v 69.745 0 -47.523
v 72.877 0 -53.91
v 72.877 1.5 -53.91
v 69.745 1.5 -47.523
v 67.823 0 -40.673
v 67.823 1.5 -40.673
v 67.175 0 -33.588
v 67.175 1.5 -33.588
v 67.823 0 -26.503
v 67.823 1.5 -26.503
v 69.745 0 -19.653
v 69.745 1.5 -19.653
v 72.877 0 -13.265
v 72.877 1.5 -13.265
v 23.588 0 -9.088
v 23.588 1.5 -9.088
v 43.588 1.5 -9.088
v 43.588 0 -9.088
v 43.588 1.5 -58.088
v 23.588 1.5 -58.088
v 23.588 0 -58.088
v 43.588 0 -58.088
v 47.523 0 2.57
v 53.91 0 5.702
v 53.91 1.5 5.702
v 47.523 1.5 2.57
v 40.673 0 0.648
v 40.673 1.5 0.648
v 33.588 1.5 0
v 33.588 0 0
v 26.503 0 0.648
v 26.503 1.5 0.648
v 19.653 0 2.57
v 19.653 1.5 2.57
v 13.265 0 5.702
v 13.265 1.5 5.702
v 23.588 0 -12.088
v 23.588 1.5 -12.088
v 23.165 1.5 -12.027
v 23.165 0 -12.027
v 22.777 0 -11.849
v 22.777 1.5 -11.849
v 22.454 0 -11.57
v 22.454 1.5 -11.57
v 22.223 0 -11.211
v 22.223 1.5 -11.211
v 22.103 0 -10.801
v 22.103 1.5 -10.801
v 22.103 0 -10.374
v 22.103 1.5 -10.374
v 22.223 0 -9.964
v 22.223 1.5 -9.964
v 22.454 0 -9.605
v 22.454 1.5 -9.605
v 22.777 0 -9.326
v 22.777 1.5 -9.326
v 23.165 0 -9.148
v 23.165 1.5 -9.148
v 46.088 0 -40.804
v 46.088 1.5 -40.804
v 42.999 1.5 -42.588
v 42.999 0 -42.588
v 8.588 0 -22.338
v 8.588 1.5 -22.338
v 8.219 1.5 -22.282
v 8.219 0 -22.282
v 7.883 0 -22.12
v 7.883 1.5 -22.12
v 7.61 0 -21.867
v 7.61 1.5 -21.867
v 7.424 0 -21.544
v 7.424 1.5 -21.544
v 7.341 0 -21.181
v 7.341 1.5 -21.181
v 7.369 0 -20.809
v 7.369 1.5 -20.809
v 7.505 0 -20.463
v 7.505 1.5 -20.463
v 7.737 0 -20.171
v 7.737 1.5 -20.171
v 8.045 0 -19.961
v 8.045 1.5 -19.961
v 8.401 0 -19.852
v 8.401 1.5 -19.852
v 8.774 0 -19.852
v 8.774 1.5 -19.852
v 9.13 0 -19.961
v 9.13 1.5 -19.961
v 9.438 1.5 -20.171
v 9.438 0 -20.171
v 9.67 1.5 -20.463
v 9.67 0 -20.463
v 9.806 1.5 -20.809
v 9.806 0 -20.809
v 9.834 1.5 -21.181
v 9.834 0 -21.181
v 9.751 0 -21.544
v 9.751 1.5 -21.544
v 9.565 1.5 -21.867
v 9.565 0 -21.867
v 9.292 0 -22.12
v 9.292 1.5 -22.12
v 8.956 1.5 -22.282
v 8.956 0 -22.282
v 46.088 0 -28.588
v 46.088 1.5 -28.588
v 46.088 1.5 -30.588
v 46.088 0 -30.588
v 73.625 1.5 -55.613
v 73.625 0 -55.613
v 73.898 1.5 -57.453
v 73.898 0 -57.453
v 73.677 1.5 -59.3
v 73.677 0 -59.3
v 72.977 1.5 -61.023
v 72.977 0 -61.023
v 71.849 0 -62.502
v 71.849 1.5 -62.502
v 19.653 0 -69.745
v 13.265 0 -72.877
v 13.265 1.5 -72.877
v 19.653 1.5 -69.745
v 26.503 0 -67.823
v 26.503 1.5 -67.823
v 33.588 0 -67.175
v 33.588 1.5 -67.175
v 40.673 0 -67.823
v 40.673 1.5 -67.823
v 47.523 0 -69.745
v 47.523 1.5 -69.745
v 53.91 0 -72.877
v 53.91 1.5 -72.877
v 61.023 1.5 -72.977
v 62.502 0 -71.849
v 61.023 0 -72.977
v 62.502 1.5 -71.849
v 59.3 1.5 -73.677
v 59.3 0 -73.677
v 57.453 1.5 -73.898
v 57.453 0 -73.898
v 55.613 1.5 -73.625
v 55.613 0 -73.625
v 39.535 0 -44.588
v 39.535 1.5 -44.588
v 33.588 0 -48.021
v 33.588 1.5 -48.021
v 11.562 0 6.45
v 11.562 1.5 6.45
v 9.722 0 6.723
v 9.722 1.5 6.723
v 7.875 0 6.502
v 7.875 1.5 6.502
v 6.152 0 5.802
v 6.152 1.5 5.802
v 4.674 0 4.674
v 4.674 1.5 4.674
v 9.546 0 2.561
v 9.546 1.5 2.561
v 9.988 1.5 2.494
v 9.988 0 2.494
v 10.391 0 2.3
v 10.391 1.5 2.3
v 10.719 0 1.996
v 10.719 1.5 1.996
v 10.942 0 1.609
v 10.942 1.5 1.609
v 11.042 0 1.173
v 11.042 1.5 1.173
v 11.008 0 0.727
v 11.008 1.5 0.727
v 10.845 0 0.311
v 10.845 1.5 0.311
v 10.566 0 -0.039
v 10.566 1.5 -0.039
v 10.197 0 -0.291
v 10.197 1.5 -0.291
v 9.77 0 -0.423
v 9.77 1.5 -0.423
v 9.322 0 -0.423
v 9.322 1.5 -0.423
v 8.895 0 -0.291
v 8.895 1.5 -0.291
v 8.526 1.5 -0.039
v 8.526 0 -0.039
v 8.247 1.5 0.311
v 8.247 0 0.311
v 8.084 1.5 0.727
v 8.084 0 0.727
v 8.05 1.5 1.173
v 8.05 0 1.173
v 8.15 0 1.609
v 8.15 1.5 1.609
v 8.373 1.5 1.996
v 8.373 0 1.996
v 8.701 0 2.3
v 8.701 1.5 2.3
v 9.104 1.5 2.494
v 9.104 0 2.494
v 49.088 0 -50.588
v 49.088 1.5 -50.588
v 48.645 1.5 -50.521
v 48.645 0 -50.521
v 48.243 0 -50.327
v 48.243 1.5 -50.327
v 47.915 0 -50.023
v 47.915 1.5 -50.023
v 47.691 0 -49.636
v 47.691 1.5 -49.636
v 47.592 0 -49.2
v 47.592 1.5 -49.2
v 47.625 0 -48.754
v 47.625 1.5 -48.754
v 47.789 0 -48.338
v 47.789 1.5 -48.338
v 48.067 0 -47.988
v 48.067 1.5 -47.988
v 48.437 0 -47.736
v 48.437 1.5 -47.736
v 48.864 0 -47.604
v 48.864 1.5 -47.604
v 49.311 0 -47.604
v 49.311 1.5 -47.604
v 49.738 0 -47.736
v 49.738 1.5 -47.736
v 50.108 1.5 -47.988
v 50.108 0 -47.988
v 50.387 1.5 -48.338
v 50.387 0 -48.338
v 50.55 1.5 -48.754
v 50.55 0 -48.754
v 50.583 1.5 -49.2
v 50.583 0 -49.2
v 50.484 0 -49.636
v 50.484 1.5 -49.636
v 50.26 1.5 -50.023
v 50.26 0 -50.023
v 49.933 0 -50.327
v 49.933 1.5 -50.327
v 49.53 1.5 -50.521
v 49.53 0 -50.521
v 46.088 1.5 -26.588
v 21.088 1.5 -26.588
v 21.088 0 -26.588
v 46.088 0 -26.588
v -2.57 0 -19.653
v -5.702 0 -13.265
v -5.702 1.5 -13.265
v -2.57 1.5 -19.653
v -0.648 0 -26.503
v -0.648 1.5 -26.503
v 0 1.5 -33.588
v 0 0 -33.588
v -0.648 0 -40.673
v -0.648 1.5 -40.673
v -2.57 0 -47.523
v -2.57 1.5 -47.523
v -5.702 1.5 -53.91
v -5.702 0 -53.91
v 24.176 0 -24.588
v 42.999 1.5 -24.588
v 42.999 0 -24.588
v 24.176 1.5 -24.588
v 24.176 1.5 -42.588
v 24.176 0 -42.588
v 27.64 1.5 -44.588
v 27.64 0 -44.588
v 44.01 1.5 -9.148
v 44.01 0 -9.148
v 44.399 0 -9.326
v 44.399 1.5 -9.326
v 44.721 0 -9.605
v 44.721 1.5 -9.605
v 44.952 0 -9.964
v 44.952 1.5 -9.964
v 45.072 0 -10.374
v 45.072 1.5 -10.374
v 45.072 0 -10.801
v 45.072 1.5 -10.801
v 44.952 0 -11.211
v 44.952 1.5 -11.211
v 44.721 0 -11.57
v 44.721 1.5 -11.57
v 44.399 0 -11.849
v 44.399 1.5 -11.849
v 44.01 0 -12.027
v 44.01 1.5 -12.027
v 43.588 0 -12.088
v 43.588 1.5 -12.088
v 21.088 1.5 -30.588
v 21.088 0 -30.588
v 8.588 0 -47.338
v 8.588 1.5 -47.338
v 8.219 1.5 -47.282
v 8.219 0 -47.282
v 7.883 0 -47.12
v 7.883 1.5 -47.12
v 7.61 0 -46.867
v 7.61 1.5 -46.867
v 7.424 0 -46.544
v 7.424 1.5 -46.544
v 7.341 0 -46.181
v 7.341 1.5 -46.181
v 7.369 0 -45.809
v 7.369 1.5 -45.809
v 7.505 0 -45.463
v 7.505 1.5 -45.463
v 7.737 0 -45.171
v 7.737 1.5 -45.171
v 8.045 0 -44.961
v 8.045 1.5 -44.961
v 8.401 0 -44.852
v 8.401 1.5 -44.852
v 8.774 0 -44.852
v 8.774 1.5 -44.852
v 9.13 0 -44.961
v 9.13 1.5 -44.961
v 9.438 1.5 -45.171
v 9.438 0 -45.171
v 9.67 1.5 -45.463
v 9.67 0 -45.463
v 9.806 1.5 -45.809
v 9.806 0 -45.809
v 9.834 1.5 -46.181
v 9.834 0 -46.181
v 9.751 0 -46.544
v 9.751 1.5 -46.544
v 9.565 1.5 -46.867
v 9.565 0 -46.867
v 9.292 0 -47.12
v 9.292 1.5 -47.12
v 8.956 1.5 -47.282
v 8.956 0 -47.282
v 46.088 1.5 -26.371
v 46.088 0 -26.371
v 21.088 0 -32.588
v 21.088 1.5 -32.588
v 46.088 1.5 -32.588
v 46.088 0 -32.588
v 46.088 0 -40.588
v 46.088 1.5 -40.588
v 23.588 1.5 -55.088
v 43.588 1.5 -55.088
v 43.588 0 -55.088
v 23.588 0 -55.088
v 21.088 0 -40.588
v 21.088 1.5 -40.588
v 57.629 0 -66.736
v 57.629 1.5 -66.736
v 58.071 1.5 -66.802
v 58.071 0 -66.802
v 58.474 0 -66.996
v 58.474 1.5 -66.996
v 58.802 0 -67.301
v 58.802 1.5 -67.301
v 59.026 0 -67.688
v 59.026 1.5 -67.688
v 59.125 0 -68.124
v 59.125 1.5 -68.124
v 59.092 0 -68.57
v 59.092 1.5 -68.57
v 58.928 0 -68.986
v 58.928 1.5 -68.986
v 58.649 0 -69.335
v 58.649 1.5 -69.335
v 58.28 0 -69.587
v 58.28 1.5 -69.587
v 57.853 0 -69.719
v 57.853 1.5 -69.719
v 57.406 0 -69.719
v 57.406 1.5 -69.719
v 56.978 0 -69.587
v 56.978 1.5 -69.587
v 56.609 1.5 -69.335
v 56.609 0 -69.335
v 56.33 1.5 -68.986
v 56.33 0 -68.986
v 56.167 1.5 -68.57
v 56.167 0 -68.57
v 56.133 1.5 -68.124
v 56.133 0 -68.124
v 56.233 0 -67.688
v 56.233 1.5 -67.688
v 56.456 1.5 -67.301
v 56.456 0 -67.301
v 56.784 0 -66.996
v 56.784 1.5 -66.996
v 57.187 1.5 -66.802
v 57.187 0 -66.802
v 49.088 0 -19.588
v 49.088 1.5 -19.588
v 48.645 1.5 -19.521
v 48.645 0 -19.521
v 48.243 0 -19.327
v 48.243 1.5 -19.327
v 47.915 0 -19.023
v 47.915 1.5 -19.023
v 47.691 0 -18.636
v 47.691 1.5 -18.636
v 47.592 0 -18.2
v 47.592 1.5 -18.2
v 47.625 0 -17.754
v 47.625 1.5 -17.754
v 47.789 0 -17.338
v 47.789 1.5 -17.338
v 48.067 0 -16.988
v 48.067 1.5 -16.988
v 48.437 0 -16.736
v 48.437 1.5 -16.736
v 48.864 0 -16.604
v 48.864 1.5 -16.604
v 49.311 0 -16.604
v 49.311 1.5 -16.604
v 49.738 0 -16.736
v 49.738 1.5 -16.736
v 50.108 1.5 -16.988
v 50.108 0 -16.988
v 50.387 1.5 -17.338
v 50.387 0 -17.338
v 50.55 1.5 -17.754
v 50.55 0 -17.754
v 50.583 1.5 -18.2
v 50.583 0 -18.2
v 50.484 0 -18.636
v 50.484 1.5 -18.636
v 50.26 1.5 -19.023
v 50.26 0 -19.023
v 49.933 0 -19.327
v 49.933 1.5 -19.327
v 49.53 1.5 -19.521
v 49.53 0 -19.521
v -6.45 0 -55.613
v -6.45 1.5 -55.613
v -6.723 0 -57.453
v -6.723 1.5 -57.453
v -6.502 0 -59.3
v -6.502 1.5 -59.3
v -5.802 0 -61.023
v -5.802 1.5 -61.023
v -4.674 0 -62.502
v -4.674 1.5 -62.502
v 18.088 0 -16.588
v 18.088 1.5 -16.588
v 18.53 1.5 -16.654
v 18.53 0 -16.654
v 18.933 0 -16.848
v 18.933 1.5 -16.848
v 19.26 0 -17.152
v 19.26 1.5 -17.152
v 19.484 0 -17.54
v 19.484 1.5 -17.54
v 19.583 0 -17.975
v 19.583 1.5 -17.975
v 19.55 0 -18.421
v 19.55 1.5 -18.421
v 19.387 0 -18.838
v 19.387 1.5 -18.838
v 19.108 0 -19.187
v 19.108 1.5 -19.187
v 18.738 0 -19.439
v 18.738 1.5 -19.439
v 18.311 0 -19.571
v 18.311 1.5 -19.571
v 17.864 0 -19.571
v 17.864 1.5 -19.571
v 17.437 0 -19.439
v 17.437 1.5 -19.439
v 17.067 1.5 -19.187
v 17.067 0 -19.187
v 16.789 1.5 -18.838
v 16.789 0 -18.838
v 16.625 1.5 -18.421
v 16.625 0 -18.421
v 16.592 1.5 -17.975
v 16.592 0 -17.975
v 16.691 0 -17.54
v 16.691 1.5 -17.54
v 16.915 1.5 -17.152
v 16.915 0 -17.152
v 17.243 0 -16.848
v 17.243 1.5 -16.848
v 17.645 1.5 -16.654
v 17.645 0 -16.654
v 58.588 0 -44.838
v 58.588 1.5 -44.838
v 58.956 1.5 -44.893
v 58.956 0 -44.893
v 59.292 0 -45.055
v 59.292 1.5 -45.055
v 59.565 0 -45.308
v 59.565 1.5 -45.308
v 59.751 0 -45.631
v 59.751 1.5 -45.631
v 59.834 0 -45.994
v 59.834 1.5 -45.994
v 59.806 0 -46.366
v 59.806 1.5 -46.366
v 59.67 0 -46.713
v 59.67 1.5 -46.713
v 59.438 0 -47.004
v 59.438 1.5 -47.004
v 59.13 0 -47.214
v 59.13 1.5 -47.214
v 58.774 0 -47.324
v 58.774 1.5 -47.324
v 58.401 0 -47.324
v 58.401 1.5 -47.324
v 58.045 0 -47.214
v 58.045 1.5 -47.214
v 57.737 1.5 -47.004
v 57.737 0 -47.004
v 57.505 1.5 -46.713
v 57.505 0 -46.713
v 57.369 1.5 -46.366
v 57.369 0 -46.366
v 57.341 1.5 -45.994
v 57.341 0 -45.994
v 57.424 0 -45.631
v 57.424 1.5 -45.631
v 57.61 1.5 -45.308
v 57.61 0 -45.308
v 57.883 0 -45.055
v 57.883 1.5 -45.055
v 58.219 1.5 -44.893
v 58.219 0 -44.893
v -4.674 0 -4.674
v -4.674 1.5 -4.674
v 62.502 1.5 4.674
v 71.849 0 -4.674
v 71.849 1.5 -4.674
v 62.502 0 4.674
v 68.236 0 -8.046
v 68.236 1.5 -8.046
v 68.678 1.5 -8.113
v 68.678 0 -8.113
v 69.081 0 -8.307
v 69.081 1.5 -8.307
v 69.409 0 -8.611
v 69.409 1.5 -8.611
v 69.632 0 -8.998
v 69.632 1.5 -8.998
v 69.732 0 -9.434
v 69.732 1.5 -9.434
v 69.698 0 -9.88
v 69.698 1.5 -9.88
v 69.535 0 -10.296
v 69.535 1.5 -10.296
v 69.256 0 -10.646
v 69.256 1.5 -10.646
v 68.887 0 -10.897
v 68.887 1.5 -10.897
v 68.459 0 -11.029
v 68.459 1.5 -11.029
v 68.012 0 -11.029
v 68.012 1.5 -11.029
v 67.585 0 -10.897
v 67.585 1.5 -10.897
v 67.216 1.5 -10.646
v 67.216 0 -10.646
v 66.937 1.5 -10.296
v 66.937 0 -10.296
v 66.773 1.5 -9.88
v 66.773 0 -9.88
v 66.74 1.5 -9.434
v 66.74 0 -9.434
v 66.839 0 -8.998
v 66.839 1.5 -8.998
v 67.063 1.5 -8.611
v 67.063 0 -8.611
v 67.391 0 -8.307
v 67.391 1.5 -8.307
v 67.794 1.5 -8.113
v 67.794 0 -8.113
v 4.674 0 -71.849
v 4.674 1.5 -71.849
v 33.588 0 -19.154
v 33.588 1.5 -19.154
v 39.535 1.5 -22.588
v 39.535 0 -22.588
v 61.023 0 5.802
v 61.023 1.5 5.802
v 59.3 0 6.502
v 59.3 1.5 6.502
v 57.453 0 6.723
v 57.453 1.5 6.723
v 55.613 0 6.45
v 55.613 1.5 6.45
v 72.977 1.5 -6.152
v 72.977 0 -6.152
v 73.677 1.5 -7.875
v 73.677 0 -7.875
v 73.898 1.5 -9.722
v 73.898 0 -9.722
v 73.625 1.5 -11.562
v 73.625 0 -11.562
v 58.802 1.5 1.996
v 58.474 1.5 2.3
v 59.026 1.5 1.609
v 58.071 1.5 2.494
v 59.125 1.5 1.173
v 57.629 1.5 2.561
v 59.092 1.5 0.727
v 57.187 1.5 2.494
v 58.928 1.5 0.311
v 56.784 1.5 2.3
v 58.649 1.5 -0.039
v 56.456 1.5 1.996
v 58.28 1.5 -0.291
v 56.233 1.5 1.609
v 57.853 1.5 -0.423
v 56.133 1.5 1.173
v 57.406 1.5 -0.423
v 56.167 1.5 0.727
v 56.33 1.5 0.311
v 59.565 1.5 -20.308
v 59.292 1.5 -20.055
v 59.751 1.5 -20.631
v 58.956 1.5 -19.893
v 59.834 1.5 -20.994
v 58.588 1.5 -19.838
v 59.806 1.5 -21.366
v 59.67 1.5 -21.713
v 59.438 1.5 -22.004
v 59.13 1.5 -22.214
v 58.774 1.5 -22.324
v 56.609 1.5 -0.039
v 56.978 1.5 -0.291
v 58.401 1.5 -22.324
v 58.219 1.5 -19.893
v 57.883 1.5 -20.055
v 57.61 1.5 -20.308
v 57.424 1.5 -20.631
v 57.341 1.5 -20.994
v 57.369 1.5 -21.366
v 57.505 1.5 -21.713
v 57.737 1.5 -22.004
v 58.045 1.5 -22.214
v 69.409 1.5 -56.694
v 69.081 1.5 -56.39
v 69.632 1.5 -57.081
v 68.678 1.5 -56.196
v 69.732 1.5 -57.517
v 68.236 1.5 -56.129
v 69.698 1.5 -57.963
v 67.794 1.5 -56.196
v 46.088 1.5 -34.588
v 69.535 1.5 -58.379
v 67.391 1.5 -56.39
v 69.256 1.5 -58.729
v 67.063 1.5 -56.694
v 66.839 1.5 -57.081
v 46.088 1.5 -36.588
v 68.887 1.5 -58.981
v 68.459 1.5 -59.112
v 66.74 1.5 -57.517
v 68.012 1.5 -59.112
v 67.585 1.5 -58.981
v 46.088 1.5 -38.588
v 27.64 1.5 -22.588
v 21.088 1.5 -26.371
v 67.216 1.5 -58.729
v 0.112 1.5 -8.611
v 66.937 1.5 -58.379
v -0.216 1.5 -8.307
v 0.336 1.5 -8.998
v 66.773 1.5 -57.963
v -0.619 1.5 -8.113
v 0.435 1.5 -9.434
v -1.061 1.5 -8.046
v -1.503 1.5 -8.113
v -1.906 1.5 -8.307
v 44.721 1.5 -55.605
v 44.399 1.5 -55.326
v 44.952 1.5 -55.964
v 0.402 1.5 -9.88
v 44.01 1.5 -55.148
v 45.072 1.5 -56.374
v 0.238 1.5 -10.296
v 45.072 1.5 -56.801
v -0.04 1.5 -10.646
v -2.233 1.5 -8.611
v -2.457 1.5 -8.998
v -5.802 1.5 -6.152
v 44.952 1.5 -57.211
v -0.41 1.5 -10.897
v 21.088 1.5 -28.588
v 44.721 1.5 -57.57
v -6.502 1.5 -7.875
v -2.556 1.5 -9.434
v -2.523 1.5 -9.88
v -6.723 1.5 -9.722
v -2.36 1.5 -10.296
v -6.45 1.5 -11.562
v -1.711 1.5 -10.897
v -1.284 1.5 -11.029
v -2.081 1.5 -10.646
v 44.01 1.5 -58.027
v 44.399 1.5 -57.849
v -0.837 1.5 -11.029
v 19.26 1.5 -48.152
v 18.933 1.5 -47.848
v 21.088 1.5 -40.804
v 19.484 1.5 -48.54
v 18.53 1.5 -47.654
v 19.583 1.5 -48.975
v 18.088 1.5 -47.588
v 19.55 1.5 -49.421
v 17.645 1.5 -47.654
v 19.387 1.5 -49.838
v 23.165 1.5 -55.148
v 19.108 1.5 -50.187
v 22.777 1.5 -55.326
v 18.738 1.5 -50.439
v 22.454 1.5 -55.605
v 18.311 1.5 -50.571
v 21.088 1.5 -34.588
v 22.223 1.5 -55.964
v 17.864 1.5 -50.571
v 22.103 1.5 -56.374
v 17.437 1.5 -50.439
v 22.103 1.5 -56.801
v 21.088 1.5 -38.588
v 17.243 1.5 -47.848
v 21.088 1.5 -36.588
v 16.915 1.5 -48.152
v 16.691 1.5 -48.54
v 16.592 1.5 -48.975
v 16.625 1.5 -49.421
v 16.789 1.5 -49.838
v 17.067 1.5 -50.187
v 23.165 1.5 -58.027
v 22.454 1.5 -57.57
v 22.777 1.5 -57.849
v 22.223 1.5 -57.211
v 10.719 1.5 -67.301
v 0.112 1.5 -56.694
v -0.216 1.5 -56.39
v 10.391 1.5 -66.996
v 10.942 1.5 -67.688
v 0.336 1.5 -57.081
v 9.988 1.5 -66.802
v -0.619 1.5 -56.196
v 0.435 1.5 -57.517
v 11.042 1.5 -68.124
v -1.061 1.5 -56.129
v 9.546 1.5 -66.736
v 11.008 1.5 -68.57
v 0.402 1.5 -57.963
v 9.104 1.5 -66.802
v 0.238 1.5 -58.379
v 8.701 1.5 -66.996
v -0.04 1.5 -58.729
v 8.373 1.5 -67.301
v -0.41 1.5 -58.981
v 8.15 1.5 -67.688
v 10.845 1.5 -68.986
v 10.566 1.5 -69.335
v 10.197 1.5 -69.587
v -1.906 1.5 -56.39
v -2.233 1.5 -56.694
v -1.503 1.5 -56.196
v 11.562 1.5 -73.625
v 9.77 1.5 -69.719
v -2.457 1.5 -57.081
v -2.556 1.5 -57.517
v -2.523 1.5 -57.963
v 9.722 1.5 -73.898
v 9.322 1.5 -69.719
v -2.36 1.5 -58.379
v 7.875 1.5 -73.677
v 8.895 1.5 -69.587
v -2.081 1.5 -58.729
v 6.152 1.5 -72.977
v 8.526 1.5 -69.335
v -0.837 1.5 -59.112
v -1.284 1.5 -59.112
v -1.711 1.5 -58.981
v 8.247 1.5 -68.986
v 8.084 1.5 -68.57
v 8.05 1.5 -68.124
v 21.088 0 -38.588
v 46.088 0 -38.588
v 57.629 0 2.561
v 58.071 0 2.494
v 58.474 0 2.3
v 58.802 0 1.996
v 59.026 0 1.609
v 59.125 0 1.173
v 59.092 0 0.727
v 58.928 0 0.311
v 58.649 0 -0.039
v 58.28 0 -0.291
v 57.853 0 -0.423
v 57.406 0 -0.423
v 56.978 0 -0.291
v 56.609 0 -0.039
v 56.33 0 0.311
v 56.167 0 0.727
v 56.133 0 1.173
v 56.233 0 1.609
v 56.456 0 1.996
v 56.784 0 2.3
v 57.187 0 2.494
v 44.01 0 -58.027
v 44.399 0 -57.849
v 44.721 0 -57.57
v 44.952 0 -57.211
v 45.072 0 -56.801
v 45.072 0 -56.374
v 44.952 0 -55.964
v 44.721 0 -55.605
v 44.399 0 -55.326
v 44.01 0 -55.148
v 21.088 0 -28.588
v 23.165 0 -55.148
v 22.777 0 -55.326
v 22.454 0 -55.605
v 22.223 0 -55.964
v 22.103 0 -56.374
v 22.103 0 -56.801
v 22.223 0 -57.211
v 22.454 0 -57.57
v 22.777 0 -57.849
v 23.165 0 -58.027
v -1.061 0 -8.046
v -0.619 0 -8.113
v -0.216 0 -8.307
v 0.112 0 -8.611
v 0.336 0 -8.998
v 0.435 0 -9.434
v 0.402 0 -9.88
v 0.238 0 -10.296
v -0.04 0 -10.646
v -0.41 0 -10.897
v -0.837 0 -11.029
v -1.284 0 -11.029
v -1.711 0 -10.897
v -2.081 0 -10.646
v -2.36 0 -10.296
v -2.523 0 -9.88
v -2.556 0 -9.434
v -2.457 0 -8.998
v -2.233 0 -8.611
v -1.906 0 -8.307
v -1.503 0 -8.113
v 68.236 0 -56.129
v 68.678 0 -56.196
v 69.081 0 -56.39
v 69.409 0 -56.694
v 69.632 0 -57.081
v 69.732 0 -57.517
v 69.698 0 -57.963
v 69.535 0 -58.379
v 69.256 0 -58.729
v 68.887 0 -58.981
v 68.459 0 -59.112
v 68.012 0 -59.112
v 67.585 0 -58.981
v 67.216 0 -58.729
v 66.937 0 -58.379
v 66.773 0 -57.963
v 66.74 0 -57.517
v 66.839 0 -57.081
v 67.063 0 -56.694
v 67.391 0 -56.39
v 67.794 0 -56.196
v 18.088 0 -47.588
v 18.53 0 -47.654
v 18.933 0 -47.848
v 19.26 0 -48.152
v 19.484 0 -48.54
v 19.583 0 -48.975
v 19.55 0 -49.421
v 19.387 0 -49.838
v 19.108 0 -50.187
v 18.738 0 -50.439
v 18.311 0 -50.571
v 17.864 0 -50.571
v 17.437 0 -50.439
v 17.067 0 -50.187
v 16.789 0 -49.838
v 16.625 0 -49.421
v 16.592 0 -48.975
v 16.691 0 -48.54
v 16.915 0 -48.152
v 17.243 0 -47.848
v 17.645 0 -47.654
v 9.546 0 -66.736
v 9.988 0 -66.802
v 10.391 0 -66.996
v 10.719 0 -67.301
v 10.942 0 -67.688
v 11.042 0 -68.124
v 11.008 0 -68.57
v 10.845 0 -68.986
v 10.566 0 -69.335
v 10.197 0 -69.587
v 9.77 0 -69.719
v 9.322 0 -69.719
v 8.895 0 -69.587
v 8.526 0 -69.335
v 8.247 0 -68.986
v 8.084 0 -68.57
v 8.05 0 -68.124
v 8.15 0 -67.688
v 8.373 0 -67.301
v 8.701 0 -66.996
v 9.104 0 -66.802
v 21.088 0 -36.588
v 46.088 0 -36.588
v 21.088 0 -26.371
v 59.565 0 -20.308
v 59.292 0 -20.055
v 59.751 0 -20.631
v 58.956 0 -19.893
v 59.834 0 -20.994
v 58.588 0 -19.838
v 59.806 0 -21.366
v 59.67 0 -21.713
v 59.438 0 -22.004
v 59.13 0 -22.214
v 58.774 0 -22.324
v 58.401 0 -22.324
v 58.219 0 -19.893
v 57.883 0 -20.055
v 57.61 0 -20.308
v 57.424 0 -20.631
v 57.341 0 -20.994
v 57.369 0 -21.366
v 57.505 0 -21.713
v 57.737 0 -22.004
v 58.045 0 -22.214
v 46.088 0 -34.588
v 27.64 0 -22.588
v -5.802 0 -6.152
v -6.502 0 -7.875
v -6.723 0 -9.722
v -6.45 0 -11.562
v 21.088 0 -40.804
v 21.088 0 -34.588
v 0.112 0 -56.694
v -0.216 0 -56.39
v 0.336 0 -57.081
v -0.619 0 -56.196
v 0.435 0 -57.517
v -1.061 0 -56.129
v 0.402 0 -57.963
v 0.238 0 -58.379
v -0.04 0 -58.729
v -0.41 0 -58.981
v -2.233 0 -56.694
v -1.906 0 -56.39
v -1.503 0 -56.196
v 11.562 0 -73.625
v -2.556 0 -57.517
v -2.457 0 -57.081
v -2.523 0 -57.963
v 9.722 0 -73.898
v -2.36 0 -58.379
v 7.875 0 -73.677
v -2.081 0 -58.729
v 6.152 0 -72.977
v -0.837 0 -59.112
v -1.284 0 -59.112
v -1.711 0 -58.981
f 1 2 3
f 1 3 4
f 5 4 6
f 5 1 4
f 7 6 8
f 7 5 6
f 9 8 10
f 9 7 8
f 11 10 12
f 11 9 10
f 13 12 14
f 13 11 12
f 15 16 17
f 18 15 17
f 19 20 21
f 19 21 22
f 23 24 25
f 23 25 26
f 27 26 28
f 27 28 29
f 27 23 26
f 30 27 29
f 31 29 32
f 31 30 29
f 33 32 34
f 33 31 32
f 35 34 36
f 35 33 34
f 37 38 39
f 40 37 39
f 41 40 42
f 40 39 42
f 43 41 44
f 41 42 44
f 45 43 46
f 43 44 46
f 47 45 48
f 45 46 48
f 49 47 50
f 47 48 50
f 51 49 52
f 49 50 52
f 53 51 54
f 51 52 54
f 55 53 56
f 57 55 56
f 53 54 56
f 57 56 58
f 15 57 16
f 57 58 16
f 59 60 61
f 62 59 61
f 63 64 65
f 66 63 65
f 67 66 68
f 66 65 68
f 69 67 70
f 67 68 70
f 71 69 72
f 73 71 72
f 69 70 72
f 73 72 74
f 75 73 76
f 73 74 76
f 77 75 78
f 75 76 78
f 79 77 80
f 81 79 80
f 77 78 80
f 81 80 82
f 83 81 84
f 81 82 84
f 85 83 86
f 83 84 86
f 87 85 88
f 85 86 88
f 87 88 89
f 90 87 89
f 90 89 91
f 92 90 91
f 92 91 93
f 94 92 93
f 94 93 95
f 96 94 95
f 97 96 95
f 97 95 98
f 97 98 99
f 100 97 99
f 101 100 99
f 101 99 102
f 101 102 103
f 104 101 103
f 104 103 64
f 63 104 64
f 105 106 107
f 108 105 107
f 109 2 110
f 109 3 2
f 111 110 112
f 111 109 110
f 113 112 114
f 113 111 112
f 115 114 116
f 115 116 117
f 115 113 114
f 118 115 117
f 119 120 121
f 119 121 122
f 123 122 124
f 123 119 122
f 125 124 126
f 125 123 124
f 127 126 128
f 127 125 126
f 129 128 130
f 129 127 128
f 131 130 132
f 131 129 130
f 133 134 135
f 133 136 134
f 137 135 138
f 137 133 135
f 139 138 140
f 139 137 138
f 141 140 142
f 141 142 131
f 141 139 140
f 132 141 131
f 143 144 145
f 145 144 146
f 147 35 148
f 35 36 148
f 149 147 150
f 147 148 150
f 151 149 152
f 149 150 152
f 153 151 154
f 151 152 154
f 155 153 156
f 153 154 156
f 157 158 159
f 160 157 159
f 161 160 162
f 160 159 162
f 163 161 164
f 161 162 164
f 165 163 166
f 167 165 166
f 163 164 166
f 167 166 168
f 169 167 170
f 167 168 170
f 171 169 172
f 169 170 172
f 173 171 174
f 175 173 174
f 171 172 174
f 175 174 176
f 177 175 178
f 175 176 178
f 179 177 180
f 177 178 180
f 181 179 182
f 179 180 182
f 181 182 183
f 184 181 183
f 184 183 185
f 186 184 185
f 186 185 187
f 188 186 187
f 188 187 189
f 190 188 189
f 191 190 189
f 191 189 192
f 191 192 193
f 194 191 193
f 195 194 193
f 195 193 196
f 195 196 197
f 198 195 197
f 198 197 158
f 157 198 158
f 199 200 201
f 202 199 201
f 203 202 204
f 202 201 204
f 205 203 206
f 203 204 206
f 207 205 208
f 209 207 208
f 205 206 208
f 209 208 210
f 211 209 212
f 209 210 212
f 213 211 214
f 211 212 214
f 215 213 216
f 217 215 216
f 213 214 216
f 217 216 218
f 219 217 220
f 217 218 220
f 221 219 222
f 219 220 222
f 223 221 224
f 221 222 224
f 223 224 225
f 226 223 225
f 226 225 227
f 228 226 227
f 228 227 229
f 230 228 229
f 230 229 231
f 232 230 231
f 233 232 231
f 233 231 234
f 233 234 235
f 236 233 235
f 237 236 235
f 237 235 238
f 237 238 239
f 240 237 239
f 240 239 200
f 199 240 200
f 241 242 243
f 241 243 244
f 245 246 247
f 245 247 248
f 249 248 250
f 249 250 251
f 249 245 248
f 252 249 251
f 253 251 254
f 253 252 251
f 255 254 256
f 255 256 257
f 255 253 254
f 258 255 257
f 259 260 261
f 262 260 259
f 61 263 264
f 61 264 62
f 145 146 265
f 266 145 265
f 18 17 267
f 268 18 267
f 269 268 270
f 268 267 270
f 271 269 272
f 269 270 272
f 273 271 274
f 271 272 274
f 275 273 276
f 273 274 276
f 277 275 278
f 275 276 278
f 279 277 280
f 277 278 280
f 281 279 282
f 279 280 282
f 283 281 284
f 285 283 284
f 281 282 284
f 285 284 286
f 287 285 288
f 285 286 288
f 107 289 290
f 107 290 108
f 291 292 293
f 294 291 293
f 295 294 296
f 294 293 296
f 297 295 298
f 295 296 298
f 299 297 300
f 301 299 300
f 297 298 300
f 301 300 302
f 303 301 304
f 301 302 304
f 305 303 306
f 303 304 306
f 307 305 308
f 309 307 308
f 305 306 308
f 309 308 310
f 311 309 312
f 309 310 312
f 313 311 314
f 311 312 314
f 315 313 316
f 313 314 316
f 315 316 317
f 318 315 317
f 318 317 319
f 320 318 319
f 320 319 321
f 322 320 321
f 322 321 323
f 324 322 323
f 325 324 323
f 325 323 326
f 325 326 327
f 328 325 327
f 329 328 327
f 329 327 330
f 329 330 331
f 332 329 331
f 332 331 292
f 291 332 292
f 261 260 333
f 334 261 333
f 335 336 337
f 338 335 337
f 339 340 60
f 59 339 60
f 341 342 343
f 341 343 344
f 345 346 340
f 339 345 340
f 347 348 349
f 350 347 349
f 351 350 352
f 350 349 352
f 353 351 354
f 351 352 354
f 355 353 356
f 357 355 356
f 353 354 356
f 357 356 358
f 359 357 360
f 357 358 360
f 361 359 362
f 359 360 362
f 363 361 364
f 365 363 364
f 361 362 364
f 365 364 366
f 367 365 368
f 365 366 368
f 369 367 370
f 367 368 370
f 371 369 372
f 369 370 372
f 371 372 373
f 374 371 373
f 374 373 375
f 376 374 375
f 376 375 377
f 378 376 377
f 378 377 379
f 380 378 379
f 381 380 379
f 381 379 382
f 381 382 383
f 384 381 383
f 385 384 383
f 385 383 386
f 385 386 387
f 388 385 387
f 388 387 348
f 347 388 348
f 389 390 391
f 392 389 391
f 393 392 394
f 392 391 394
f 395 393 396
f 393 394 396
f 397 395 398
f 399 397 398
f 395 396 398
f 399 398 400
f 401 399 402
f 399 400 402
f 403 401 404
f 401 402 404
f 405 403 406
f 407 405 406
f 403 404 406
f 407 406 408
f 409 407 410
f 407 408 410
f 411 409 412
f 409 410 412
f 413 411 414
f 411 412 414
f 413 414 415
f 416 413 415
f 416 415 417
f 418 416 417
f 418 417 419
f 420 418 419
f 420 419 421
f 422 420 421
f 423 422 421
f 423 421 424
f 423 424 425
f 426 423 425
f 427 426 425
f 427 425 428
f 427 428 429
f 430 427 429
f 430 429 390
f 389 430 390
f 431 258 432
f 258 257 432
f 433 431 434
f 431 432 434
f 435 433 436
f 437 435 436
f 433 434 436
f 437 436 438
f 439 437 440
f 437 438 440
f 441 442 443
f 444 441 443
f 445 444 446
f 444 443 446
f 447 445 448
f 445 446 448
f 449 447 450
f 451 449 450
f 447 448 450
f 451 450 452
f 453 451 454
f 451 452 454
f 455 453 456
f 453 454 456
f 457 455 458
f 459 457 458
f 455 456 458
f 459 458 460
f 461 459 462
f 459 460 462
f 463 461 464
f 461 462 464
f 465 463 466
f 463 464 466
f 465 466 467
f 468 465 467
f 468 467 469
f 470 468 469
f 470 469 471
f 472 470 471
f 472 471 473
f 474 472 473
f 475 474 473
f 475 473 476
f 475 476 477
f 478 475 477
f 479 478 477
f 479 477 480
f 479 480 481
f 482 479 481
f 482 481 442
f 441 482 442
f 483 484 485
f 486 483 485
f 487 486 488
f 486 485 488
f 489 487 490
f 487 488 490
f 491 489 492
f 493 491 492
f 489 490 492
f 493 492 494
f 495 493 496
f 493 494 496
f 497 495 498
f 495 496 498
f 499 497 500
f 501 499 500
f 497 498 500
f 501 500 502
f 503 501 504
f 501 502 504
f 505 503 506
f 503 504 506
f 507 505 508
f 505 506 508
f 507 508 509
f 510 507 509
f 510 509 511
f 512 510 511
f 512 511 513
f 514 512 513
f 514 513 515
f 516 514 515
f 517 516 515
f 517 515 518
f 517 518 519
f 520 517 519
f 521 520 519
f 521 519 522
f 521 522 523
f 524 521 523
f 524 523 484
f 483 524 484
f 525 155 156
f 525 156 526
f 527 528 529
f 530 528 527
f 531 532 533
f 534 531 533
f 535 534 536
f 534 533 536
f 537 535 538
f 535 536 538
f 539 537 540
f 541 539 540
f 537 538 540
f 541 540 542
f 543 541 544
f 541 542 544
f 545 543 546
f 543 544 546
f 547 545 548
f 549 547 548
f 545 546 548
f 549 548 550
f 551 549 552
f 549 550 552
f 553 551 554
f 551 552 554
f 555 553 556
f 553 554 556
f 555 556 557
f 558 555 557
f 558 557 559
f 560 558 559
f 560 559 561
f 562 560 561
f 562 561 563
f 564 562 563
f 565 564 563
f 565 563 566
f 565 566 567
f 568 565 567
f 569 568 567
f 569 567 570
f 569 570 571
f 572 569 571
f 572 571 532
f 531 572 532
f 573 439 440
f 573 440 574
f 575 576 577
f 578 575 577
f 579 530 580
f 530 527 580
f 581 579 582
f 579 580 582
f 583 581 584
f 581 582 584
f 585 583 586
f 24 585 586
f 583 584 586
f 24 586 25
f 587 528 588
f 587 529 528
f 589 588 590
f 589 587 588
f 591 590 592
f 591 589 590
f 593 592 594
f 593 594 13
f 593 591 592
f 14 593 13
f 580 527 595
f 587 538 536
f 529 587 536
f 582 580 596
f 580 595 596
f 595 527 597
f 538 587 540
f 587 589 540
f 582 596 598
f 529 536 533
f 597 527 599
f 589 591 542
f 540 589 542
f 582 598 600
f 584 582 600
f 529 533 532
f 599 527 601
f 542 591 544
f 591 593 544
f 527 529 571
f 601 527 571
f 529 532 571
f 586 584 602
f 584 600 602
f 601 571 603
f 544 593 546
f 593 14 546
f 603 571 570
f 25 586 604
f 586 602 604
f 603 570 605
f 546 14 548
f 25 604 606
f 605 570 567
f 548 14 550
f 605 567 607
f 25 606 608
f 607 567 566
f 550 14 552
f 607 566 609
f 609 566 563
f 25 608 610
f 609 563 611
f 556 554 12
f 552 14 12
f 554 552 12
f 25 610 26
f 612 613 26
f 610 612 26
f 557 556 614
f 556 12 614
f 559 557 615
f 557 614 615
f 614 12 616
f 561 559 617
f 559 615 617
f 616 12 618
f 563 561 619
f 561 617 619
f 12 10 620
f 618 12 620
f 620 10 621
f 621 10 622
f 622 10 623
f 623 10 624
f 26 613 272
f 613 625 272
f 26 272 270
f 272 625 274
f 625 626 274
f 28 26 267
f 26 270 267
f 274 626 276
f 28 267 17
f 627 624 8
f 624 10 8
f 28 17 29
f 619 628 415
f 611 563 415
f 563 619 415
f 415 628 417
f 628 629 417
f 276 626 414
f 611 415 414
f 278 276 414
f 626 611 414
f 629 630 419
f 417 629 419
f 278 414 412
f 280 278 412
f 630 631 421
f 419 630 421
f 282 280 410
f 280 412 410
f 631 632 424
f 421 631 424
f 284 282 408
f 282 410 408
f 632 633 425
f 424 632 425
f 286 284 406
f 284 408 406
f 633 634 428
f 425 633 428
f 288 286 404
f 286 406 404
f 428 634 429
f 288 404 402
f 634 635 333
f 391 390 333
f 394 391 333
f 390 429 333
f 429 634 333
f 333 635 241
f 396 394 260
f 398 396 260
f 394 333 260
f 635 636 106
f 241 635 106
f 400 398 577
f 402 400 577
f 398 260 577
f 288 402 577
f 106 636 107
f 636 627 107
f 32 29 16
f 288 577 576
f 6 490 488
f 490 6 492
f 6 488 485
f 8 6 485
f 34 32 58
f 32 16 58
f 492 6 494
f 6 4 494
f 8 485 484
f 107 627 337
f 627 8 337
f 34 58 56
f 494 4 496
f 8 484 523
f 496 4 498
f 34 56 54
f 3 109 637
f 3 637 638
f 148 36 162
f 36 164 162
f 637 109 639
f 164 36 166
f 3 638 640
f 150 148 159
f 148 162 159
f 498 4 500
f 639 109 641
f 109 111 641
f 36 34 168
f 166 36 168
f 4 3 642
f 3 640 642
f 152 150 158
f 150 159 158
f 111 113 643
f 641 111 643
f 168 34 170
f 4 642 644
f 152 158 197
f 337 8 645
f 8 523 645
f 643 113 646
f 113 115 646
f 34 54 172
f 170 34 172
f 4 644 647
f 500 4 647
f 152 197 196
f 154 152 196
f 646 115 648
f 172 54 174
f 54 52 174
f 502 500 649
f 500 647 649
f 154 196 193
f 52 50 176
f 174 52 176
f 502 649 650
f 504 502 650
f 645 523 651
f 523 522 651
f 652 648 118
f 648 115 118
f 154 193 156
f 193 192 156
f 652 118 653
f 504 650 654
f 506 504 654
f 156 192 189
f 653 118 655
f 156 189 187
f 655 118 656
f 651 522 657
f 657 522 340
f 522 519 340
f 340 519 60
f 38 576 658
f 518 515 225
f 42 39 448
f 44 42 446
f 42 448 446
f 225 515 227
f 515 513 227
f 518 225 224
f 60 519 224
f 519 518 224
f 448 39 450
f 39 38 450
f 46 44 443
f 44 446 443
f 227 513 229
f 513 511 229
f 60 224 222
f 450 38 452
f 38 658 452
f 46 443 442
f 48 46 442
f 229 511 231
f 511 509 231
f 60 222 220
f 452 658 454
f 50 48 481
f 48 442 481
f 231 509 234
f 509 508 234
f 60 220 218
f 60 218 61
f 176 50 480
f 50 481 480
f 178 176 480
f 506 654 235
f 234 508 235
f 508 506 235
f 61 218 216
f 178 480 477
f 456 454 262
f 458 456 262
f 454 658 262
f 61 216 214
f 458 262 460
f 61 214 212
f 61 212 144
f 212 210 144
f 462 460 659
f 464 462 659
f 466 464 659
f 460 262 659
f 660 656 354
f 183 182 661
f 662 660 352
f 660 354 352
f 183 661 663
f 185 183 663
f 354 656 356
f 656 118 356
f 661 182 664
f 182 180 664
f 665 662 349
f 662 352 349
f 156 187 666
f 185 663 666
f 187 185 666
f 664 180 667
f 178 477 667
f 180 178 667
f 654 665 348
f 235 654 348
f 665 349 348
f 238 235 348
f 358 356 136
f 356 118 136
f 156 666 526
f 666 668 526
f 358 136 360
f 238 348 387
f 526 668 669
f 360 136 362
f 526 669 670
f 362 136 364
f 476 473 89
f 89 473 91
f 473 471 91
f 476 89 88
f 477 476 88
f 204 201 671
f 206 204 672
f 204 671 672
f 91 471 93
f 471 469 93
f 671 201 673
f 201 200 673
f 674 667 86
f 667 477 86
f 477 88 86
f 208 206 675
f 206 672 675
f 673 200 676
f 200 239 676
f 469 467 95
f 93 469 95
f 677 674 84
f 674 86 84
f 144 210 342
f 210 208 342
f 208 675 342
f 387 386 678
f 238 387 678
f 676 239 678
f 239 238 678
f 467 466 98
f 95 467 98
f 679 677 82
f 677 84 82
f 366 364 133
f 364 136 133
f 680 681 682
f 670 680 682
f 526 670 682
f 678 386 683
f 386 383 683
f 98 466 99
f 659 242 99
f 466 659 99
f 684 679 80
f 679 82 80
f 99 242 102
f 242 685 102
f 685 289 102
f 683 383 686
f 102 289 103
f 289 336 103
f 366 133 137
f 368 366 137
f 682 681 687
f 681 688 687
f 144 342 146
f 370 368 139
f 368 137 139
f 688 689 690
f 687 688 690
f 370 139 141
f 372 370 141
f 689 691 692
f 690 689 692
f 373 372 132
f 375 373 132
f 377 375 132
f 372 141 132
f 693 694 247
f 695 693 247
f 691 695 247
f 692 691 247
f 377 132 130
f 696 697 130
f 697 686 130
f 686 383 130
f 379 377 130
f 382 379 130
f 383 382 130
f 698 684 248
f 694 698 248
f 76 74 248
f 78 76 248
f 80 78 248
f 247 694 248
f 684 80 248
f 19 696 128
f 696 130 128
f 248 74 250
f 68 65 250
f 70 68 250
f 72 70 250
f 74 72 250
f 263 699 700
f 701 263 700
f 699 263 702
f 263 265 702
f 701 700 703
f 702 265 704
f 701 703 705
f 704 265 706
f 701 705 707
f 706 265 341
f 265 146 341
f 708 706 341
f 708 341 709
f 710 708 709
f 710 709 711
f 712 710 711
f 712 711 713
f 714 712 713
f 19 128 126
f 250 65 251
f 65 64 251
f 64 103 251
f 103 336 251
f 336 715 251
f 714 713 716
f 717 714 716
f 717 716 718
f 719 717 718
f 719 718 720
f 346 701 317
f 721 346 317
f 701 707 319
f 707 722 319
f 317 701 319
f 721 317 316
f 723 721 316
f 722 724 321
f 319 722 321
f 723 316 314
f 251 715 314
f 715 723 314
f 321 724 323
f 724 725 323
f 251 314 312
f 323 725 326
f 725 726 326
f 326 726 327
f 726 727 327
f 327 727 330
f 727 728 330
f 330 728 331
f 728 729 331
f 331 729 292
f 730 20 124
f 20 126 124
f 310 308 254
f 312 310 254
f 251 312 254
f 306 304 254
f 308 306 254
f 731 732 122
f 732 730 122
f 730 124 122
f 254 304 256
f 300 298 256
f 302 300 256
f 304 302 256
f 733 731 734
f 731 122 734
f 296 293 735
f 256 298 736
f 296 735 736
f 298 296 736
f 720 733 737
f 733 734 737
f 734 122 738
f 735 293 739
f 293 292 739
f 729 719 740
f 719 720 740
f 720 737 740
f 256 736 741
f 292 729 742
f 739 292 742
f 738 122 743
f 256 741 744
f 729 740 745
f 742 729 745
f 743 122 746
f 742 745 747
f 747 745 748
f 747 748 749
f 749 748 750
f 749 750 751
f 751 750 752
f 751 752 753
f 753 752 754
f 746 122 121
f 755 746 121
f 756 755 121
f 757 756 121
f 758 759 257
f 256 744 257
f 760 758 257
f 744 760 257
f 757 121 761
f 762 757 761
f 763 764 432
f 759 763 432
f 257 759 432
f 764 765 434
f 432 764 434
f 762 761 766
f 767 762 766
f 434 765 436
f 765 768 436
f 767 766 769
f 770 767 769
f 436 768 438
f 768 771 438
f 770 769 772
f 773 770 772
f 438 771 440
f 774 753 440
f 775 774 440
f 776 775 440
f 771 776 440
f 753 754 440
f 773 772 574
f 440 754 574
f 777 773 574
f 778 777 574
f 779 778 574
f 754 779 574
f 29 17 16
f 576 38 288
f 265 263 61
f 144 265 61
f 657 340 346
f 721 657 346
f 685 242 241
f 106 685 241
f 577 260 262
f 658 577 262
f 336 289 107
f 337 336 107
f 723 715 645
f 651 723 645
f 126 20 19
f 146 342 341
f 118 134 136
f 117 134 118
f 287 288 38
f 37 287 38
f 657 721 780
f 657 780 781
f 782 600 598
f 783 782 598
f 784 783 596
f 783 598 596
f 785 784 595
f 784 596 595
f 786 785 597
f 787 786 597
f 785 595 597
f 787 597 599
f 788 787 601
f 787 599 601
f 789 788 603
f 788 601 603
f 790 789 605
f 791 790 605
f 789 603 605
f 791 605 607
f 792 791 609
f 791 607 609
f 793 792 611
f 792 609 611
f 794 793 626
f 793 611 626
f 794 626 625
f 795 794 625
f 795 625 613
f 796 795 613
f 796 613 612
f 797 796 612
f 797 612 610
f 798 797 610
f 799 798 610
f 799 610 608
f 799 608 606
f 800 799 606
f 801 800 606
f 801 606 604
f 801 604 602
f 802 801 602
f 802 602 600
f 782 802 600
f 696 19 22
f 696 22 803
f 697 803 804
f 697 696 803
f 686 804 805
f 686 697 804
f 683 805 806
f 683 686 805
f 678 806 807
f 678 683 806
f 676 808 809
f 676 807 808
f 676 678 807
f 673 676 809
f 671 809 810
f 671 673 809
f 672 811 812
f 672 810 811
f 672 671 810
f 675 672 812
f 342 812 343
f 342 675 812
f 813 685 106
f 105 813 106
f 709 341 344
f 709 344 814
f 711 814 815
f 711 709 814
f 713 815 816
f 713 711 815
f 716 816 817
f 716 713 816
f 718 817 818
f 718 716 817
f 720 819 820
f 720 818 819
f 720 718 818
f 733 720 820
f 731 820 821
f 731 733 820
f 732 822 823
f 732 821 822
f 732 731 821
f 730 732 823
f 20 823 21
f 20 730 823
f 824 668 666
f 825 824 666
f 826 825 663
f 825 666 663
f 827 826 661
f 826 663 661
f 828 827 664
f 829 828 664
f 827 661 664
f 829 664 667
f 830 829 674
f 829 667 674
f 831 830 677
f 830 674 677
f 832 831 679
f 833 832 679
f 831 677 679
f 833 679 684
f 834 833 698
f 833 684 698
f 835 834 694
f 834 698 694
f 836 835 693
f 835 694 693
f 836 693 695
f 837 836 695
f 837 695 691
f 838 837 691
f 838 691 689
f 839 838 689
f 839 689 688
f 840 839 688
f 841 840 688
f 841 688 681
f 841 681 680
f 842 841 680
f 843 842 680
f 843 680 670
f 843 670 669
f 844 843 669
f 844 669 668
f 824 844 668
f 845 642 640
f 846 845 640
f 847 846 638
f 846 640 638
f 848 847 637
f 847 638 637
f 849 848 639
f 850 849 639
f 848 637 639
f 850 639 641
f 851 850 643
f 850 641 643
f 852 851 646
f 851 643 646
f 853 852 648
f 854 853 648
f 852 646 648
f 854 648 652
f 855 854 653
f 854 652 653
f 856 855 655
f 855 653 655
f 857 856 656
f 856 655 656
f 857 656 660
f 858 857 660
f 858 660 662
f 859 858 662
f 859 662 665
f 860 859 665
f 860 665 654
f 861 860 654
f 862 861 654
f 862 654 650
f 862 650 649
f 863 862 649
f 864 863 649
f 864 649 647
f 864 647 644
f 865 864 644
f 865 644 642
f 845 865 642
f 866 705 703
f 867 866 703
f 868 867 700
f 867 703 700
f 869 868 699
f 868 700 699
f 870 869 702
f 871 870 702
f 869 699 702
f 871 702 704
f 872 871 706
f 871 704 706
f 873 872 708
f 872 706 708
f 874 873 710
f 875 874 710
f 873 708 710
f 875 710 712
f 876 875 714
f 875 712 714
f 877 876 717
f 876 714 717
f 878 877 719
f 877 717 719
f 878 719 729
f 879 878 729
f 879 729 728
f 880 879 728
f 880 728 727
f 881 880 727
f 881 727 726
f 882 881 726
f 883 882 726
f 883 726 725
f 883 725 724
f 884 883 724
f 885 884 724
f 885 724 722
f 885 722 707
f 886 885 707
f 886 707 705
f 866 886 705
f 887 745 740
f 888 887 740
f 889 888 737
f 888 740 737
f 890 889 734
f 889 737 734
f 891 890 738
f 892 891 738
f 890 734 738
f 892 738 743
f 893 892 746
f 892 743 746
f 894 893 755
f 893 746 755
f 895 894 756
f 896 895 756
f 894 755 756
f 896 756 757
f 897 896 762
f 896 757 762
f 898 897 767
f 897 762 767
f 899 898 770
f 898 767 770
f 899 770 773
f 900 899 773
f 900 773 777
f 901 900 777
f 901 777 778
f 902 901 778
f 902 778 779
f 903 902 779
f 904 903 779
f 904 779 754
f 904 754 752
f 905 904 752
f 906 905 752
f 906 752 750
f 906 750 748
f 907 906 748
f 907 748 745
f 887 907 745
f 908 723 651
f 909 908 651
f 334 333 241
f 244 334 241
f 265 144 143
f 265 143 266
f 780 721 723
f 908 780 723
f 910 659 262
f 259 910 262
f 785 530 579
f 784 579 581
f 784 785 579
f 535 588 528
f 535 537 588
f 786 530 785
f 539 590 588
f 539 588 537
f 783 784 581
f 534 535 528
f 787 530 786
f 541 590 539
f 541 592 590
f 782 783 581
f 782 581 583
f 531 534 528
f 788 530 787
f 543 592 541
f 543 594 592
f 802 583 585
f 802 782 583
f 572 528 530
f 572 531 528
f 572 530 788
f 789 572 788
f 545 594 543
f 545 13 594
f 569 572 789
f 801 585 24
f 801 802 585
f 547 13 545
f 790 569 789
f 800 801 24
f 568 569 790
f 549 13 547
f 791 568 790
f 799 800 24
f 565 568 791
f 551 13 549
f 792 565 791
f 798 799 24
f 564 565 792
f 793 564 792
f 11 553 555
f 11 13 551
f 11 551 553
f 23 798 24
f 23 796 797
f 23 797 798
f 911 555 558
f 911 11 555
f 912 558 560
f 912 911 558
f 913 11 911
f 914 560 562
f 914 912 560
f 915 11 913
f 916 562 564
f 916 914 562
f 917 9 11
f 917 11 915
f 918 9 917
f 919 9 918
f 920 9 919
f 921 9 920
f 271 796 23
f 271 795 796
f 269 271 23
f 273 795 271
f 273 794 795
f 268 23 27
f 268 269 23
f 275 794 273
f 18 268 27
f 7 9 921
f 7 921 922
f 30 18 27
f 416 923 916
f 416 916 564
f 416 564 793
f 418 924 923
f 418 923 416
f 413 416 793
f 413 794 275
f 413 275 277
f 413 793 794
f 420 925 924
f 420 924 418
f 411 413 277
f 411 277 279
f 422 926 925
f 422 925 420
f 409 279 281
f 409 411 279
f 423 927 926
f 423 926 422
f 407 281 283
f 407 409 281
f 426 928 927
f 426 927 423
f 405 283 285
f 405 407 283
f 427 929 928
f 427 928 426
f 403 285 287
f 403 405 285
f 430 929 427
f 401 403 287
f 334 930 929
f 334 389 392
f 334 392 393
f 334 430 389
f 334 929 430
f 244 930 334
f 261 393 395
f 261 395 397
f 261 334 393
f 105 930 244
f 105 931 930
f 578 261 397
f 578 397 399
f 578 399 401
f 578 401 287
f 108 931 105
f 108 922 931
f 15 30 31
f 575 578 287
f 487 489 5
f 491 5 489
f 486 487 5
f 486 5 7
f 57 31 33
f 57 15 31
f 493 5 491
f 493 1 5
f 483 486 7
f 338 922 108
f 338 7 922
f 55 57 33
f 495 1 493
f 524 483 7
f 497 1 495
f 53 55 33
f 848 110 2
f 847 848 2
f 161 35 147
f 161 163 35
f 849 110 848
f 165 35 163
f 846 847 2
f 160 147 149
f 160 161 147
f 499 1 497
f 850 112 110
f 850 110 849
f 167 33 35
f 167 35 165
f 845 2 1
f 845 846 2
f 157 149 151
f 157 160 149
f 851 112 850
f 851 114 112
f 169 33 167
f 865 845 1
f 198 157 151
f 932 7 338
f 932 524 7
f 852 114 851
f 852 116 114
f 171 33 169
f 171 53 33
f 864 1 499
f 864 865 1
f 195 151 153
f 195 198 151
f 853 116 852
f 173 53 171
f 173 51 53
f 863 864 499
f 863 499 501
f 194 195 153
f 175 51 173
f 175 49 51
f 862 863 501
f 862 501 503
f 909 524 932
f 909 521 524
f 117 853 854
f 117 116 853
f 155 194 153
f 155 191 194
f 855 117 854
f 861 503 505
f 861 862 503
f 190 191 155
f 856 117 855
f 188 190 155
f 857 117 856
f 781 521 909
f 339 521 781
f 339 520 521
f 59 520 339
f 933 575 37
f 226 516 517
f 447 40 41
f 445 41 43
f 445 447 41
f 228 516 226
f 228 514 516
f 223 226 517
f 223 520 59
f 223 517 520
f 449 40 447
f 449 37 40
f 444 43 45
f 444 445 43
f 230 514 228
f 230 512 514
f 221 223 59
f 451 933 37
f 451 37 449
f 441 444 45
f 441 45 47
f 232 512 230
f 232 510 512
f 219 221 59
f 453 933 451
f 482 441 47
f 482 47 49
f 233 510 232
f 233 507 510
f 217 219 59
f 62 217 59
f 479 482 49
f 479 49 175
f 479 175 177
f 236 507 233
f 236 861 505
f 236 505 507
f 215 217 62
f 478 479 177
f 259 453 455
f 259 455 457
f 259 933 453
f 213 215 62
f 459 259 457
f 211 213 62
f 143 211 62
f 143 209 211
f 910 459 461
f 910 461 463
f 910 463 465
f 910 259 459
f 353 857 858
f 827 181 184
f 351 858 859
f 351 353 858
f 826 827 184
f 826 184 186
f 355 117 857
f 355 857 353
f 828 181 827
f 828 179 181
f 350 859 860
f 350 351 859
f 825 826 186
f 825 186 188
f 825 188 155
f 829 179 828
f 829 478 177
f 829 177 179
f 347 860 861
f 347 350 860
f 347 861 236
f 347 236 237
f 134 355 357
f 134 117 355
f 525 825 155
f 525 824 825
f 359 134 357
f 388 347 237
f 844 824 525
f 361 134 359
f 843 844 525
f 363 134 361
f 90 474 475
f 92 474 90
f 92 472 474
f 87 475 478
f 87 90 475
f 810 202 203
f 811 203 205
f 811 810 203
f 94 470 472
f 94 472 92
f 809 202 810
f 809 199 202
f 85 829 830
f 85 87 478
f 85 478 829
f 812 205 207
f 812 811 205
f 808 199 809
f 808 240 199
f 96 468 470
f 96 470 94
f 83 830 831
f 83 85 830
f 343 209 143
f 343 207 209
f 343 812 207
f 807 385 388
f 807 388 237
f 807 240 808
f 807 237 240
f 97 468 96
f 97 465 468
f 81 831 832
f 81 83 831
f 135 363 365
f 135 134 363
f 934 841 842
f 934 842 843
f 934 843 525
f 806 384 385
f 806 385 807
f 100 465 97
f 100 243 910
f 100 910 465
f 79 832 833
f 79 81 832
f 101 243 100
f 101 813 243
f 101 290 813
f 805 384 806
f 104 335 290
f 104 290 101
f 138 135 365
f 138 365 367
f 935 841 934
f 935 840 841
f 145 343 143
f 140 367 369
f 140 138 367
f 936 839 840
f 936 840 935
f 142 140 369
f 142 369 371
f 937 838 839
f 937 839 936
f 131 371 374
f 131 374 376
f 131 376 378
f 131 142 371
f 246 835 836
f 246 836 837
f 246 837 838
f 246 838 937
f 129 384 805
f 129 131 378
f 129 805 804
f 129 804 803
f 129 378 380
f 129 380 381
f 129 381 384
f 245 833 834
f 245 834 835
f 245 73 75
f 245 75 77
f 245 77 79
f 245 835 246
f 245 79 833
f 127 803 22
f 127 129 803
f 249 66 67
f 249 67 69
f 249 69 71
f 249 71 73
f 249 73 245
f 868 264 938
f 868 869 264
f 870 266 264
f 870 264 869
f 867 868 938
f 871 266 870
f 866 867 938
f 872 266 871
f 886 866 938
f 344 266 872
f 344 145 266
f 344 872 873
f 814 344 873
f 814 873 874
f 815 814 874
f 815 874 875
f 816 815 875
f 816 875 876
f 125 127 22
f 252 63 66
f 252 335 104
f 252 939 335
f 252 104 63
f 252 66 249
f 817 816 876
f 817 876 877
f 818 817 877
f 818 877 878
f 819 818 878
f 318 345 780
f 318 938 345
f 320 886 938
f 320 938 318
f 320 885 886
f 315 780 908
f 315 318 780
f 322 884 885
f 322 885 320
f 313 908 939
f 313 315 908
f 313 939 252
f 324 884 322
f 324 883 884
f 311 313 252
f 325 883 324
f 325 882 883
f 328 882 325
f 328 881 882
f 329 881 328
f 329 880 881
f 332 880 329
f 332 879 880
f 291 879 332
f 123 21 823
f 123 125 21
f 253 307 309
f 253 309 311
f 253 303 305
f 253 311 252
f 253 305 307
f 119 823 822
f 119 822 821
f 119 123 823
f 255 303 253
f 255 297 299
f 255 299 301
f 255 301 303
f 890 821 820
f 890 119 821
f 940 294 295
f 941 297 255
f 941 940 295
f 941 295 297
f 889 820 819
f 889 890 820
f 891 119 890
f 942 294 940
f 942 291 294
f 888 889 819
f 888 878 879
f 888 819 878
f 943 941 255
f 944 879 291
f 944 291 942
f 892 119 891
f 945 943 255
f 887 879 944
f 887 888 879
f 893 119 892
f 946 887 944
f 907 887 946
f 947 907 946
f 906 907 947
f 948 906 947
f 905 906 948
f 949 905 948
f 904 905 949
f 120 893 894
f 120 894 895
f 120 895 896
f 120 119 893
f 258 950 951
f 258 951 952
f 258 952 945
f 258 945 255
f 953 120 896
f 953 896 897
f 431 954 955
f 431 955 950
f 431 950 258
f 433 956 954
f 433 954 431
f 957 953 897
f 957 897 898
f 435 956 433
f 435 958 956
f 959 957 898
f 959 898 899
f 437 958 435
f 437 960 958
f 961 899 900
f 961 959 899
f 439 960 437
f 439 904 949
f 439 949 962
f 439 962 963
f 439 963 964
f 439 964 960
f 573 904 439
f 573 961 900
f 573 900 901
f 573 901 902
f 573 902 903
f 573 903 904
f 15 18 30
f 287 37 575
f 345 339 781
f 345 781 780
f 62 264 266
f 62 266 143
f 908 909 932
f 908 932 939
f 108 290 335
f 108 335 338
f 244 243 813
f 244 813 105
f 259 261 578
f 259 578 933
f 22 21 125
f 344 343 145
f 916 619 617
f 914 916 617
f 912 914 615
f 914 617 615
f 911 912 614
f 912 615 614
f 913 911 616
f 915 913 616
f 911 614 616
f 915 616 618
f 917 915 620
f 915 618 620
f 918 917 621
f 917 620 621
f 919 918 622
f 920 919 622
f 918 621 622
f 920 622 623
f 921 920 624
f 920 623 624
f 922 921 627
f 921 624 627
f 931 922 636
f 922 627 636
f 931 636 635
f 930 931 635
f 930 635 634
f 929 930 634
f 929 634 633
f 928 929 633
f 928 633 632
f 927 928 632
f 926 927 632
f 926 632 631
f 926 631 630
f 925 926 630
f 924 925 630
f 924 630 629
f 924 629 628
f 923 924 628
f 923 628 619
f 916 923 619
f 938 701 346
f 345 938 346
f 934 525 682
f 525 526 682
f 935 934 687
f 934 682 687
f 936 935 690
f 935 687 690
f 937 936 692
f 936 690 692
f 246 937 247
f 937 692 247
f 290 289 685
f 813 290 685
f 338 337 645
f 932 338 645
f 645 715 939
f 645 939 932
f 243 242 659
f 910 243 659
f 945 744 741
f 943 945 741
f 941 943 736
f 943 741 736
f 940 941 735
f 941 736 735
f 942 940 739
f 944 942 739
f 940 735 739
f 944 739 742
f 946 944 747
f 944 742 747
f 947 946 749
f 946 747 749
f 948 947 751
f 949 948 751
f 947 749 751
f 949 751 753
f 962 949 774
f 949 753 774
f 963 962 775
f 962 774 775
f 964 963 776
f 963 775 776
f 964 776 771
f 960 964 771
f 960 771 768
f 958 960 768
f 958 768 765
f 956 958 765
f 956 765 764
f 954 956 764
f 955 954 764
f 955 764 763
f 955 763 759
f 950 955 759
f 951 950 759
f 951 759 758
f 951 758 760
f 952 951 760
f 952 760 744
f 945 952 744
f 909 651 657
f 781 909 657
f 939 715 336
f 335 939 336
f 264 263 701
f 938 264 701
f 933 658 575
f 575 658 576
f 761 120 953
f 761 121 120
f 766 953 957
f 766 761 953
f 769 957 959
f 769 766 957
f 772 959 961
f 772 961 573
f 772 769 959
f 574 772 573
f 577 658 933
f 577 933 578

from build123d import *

# Parameters (mm, degrees)
BOSS_EXTRUDE1_DEPTH = 1.5
SKETCH2_R           = 1.5
CUT_EXTRUDE1_DEPTH  = 108.510464607
FILLET1_R           = 7
SKETCH3_R           = 1.5
CUT_EXTRUDE2_DEPTH  = 105.519616835
SKETCH6_R           = 1.25
CUT_EXTRUDE3_DEPTH  = 105.519616835
SKETCH8_W           = 25
SKETCH8_H           = 2
BOSS_EXTRUDE2_DEPTH = 1.5


with BuildPart() as part:
    # Sketch1 → Boss-Extrude1 (new body)
    with BuildSketch(Plane(origin=(0, 0, 0), x_dir=(1, 0, 0), z_dir=(0, 1, 0))):
        with BuildLine():
            Line((76.013978978, 8.838834765), (58.336309448, -8.838834765))
            ThreePointArc((58.336309448, -8.838834765), (33.587572106, 0), (8.838834765, -8.838834765))
            Line((8.838834765, -8.838834765), (-8.838834765, 8.838834765))
            ThreePointArc((-8.838834765, 8.838834765), (0, 33.587572106), (-8.838834765, 58.336309448))
            Line((-8.838834765, 58.336309448), (8.838834765, 76.013978978))
            ThreePointArc((8.838834765, 76.013978978), (33.587572106, 67.175144213), (58.336309448, 76.013978978))
            Line((58.336309448, 76.013978978), (76.013978978, 58.336309448))
            ThreePointArc((76.013978978, 58.336309448), (67.175144213, 33.587572106), (76.013978978, 8.838834765))
        make_face()
    extrude(amount=BOSS_EXTRUDE1_DEPTH)

    # Sketch2 → Cut-Extrude1 (cut, through all)
    with BuildSketch(Plane(origin=(0, 1.5, 0), x_dir=(1, 0, 0), z_dir=(0, 1, 0))):
        with Locations(Location((57.629202667, 68.235804385, 0), (0, 0, 270))):
            Circle(SKETCH2_R)
        with Locations(Location((68.235804385, 57.629202667, 0), (0, 0, 270))):
            Circle(SKETCH2_R)
        with Locations(Location((68.235804385, 9.545941546, 0), (0, 0, 270))):
            Circle(SKETCH2_R)
        with Locations(Location((57.629202667, -1.060660172, 0), (0, 0, 270))):
            Circle(SKETCH2_R)
        with Locations(Location((9.545941546, -1.060660172, 0), (0, 0, 270))):
            Circle(SKETCH2_R)
        with Locations(Location((-1.060660172, 9.545941546, 0), (0, 0, 270))):
            Circle(SKETCH2_R)
        with Locations(Location((-1.060660172, 57.629202667, 0), (0, 0, 270))):
            Circle(SKETCH2_R)
        with Locations(Location((9.545941546, 68.235804385, 0), (0, 0, 270))):
            Circle(SKETCH2_R)
    extrude(amount=-CUT_EXTRUDE1_DEPTH, mode=Mode.SUBTRACT)

    # Fillet1
    fillet1_edges = [part.edges().sort_by_distance(p)[0] for p in [
        (76.013978978, 0.75, -8.838834765),
        (58.336309448, 0.75, 8.838834765),
        (8.838834765, 0.75, 8.838834765),
        (-8.838834765, 0.75, -8.838834765),
        (-8.838834765, 0.75, -58.336309448),
        (8.838834765, 0.75, -76.013978978),
        (58.336309448, 0.75, -76.013978978),
        (76.013978978, 0.75, -58.336309448),
    ]]
    fillet(fillet1_edges, radius=FILLET1_R)

    # Sketch3 → Cut-Extrude2 (cut, through all)
    with BuildSketch(Plane(origin=(0, 1.5, 0), x_dir=(1, 0, 0), z_dir=(0, 1, 0))):
        with Locations(Location((18.087572106, 49.087572106, 0), (0, 0, 270))):
            Circle(SKETCH3_R)
        with Locations(Location((18.087572106, 18.087572106, 0), (0, 0, 270))):
            Circle(SKETCH3_R)
        with Locations(Location((49.087572106, 18.087572106, 0), (0, 0, 90))):
            Circle(SKETCH3_R)
        with Locations(Location((49.087572106, 49.087572106, 0), (0, 0, 90))):
            Circle(SKETCH3_R)
    extrude(amount=-CUT_EXTRUDE2_DEPTH, mode=Mode.SUBTRACT)

    # Sketch6 → Cut-Extrude3 (cut, through all)
    with BuildSketch(Plane(origin=(0, 1.5, 0), x_dir=(1, 0, 0), z_dir=(0, 1, 0))):
        with Locations(Location((58.587572106, 46.087572106, 0), (0, 0, 270))):
            Circle(SKETCH6_R)
        with Locations(Location((58.587572106, 21.087572106, 0), (0, 0, 270))):
            Circle(SKETCH6_R)
        with Locations(Location((8.587572106, 21.087572106, 0), (0, 0, 90))):
            Circle(SKETCH6_R)
        with Locations(Location((8.587572106, 46.087572106, 0), (0, 0, 90))):
            Circle(SKETCH6_R)
        with BuildLine():
            Line((23.587572106, 58.087572106), (43.587572106, 58.087572106))
            ThreePointArc((43.587572106, 58.087572106), (45.087572106, 56.587572106), (43.587572106, 55.087572106))
            Line((43.587572106, 55.087572106), (23.587572106, 55.087572106))
            ThreePointArc((23.587572106, 55.087572106), (22.087572106, 56.587572106), (23.587572106, 58.087572106))
        make_face()
        with BuildLine():
            Line((23.587572106, 9.087572106), (43.587572106, 9.087572106))
            ThreePointArc((43.587572106, 9.087572106), (45.087572106, 10.587572106), (43.587572106, 12.087572106))
            Line((43.587572106, 12.087572106), (23.587572106, 12.087572106))
            ThreePointArc((23.587572106, 12.087572106), (22.087572106, 10.587572106), (23.587572106, 9.087572106))
        make_face()
        Polygon((33.587572106, 48.021328836), (21.087572106, 40.804450471), (21.087572106, 26.370693741), (33.587572106, 19.153815377), (46.087572106, 26.370693741), (46.087572106, 40.804450471), align=None)
    extrude(amount=-CUT_EXTRUDE3_DEPTH, mode=Mode.SUBTRACT)

    # Sketch8 → Boss-Extrude2 (add, through all)
    with BuildSketch(Plane(origin=(0, 1.5, 0), x_dir=(1, 0, 0), z_dir=(0, 1, 0))):
        with Locations((33.587572106, 35.587572106)):
            Rectangle(SKETCH8_W, SKETCH8_H)
        with Locations((33.587572106, 31.587572106)):
            Rectangle(SKETCH8_W, SKETCH8_H)
        with Locations((33.587572106, 39.587572106)):
            Rectangle(SKETCH8_W, SKETCH8_H)
        Polygon((24.176029374, 42.587572106), (42.999114838, 42.587572106), (39.535013223, 44.587572106), (27.64013099, 44.587572106), align=None)
        with Locations((33.587572106, 27.587572106)):
            Rectangle(SKETCH8_W, SKETCH8_H)
        Polygon((39.535013223, 22.587572106), (42.999114838, 24.587572106), (24.176029374, 24.587572106), (27.64013099, 22.587572106), align=None)
    extrude(amount=-BOSS_EXTRUDE2_DEPTH)


solid = part.part
